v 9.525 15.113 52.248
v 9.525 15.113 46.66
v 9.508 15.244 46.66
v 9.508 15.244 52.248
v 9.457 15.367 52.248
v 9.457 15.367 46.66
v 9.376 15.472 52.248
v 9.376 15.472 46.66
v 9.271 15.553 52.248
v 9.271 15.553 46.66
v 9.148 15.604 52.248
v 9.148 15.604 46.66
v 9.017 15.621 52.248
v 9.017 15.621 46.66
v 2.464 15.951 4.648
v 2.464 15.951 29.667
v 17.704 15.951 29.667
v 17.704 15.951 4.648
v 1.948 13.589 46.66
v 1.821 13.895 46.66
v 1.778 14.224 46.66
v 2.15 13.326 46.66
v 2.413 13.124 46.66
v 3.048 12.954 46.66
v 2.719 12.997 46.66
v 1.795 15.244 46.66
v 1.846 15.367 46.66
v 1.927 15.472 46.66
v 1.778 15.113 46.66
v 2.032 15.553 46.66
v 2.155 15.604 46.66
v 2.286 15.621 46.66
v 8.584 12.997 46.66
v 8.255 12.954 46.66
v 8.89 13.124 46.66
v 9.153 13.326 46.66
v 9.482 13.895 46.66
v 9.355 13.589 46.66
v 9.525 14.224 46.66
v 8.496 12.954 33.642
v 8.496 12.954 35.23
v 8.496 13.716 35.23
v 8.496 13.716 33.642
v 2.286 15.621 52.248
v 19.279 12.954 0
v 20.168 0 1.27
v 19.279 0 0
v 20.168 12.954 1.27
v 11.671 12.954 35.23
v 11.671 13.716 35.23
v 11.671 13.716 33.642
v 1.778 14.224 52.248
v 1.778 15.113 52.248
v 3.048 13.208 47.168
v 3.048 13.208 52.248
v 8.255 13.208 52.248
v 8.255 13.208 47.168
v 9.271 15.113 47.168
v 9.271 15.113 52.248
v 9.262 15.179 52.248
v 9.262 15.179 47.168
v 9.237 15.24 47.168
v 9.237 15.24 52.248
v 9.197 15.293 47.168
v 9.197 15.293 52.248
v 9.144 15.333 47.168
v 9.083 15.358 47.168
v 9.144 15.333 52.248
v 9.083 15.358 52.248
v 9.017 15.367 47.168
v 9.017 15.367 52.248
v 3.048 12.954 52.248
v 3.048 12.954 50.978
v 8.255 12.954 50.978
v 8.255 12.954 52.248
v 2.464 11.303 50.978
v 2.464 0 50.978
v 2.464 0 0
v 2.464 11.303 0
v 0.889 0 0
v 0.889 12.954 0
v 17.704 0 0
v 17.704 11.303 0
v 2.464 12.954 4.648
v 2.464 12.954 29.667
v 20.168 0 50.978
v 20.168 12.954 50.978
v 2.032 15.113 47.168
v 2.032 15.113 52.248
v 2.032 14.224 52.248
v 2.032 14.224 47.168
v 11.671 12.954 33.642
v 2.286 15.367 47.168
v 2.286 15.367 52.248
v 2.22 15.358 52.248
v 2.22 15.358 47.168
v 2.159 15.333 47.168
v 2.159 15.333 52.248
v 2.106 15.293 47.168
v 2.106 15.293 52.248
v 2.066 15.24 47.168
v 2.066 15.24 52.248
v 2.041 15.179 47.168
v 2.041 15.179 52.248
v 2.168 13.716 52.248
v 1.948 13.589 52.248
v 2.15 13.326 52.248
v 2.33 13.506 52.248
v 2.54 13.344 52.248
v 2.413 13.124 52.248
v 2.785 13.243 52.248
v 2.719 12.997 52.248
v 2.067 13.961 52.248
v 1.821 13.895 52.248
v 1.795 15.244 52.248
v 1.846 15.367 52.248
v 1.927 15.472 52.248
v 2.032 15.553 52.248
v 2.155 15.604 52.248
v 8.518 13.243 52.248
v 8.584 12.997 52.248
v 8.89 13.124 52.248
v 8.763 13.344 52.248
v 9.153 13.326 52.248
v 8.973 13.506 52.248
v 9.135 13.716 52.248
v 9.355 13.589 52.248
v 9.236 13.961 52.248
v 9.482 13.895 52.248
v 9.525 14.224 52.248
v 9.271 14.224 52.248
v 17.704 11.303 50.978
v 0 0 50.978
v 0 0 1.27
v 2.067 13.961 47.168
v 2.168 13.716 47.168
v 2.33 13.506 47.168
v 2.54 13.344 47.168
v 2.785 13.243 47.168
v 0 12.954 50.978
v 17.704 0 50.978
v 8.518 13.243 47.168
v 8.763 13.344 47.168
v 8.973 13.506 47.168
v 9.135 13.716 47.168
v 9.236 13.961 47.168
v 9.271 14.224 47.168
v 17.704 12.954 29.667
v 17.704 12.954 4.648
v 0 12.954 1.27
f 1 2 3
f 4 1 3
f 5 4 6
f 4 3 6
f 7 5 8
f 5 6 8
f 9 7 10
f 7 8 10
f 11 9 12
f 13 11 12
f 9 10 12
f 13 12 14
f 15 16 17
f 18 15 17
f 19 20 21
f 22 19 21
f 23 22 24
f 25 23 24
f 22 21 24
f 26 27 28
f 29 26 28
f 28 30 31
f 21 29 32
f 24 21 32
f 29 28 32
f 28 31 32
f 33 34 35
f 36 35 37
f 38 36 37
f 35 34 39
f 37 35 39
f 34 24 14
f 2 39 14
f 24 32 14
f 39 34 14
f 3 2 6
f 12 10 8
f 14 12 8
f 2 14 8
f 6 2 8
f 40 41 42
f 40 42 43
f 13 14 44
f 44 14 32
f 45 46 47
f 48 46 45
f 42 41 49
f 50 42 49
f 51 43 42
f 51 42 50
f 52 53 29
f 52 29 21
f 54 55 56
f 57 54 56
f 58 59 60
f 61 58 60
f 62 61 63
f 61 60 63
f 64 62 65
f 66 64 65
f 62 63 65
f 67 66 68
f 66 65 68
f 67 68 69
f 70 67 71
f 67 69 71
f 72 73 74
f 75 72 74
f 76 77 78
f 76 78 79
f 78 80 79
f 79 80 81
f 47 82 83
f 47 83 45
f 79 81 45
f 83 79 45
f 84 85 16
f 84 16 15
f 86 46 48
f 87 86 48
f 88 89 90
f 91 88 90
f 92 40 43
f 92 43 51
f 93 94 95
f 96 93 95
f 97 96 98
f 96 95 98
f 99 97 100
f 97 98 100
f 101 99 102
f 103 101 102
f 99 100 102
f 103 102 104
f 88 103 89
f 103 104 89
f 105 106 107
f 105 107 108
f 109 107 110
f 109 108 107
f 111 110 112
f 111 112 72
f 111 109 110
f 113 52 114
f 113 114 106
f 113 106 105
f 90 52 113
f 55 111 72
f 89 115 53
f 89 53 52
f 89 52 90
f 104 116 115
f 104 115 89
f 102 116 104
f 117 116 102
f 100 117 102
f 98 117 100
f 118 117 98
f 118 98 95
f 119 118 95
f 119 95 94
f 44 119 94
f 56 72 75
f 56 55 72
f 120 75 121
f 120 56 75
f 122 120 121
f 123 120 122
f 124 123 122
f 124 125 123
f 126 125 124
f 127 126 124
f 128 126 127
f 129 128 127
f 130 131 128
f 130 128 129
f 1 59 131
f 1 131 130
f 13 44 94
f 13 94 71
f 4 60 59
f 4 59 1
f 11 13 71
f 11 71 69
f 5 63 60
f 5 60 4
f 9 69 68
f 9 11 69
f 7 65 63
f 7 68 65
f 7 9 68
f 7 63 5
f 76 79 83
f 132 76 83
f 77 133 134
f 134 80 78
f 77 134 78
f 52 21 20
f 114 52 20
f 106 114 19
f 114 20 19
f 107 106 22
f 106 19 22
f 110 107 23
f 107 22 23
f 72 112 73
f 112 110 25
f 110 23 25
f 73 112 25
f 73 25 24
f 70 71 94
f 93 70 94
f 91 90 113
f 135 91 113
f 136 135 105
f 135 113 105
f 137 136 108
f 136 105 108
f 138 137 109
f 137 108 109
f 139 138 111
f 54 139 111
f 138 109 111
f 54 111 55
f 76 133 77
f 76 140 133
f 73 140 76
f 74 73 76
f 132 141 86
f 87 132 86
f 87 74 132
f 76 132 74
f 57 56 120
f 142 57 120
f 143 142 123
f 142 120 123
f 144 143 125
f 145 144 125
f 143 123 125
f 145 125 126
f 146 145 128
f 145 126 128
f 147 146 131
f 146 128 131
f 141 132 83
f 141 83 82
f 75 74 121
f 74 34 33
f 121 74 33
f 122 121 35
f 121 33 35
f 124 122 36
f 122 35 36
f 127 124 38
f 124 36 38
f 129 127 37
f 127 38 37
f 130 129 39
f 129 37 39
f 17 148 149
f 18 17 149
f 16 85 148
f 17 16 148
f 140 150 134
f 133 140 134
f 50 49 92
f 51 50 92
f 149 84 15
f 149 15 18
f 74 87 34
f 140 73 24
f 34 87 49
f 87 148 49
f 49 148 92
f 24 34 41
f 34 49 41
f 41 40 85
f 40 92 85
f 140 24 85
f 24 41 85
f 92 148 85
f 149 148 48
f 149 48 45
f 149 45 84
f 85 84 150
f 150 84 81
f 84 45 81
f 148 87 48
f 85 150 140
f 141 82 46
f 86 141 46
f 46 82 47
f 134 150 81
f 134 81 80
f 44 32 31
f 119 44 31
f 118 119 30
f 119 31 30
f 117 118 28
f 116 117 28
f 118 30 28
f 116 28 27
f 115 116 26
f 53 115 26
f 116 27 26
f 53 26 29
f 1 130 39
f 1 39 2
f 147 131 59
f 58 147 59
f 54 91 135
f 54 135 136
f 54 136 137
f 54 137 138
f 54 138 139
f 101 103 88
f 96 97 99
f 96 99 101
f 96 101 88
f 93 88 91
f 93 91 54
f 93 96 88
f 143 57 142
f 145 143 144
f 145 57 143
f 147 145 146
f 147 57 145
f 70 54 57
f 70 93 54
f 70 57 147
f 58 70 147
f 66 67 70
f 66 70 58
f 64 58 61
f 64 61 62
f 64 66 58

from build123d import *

# Parameters (mm, degrees)
BOSS_EXTRUDE1_DEPTH      = 50.9778
CHAMFER1_SIZE            = 0.889
CHAMFER1_SIZE2           = 1.269623578
BOSS_EXTRUDE2_DEPTH      = 1.27
BOSS_EXTRUDE2_DEPTH_BACK = 4.318
CUT_EXTRUDE1_DEPTH       = 5.08
SKETCH4_W                = 3.175
SKETCH4_H                = 1.5875
BOSS_EXTRUDE3_DEPTH      = 0.762
SKETCH5_W                = 15.24
SKETCH5_H                = 25.019
BOSS_EXTRUDE4_DEPTH      = 2.9972


with BuildPart() as part:
    # Sketch1 → Boss-Extrude1 (new body)
    with BuildSketch(Plane.XY):
        Polygon((0, 0), (2.4638, 0), (2.4638, 11.303), (17.7038, 11.303), (17.7038, 0), (20.1676, 0), (20.1676, 12.954), (0, 12.954), align=None)
    extrude(amount=BOSS_EXTRUDE1_DEPTH)

    # Chamfer1
    chamfer1_edges = [part.edges().sort_by_distance(p)[0] for p in [
        (0, 6.477, 0),
        (20.1676, 6.477, 0),
    ]]
    chamfer1_side = [part.faces().sort_by_distance(p)[0] for p in [
        (1.2319, 0.239695266, 0),
    ]]
    chamfer(chamfer1_edges, length=CHAMFER1_SIZE, length2=CHAMFER1_SIZE2, reference=chamfer1_side[0])

    # Sketch2 → Boss-Extrude2 (add, two sides: drawn at the far end of the back side and taken through both)
    with BuildSketch(Plane.XY.offset(50.9778).offset(-BOSS_EXTRUDE2_DEPTH_BACK)):
        with BuildLine():
            Line((3.048, 12.954), (8.255, 12.954))
            ThreePointArc((8.255, 12.954), (9.153025612, 13.325974388), (9.525, 14.224))
            Line((9.525, 14.224), (9.525, 15.113))
            ThreePointArc((9.525, 15.113), (9.376210245, 15.472210245), (9.017, 15.621))
            Line((9.017, 15.621), (2.286, 15.621))
            ThreePointArc((2.286, 15.621), (1.926789755, 15.472210245), (1.778, 15.113))
            Line((1.778, 15.113), (1.778, 14.224))
            ThreePointArc((1.778, 14.224), (2.149974388, 13.325974388), (3.048, 12.954))
        make_face()
    extrude(amount=BOSS_EXTRUDE2_DEPTH + BOSS_EXTRUDE2_DEPTH_BACK)

    # Sketch3 → Cut-Extrude1 (cut)
    with BuildSketch(Plane.XY.offset(52.2478)):
        with BuildLine():
            Line((9.271, 14.224), (9.271, 15.113))
            ThreePointArc((9.271, 15.113), (9.196605122, 15.292605122), (9.017, 15.367))
            Line((9.017, 15.367), (2.286, 15.367))
            ThreePointArc((2.286, 15.367), (2.106394878, 15.292605122), (2.032, 15.113))
            Line((2.032, 15.113), (2.032, 14.224))
            ThreePointArc((2.032, 14.224), (2.32957951, 13.50557951), (3.048, 13.208))
            Line((3.048, 13.208), (8.255, 13.208))
            ThreePointArc((8.255, 13.208), (8.97342049, 13.50557951), (9.271, 14.224))
        make_face()
    extrude(amount=-CUT_EXTRUDE1_DEPTH, mode=Mode.SUBTRACT)

    # Sketch4 → Boss-Extrude3 (add)
    with BuildSketch(Plane(origin=(0, 12.954, 0), x_dir=(1, 0, 0), z_dir=(0, 1, 0))):
        with Locations((10.0838, -34.43605)):
            Rectangle(SKETCH4_W, SKETCH4_H)
    extrude(amount=BOSS_EXTRUDE3_DEPTH)

    # Sketch5 → Boss-Extrude4 (add)
    with BuildSketch(Plane(origin=(0, 12.954, 0), x_dir=(1, 0, 0), z_dir=(0, 1, 0))):
        with Locations((10.0838, -17.1577)):
            Rectangle(SKETCH5_W, SKETCH5_H)
    extrude(amount=BOSS_EXTRUDE4_DEPTH)


solid = part.part
